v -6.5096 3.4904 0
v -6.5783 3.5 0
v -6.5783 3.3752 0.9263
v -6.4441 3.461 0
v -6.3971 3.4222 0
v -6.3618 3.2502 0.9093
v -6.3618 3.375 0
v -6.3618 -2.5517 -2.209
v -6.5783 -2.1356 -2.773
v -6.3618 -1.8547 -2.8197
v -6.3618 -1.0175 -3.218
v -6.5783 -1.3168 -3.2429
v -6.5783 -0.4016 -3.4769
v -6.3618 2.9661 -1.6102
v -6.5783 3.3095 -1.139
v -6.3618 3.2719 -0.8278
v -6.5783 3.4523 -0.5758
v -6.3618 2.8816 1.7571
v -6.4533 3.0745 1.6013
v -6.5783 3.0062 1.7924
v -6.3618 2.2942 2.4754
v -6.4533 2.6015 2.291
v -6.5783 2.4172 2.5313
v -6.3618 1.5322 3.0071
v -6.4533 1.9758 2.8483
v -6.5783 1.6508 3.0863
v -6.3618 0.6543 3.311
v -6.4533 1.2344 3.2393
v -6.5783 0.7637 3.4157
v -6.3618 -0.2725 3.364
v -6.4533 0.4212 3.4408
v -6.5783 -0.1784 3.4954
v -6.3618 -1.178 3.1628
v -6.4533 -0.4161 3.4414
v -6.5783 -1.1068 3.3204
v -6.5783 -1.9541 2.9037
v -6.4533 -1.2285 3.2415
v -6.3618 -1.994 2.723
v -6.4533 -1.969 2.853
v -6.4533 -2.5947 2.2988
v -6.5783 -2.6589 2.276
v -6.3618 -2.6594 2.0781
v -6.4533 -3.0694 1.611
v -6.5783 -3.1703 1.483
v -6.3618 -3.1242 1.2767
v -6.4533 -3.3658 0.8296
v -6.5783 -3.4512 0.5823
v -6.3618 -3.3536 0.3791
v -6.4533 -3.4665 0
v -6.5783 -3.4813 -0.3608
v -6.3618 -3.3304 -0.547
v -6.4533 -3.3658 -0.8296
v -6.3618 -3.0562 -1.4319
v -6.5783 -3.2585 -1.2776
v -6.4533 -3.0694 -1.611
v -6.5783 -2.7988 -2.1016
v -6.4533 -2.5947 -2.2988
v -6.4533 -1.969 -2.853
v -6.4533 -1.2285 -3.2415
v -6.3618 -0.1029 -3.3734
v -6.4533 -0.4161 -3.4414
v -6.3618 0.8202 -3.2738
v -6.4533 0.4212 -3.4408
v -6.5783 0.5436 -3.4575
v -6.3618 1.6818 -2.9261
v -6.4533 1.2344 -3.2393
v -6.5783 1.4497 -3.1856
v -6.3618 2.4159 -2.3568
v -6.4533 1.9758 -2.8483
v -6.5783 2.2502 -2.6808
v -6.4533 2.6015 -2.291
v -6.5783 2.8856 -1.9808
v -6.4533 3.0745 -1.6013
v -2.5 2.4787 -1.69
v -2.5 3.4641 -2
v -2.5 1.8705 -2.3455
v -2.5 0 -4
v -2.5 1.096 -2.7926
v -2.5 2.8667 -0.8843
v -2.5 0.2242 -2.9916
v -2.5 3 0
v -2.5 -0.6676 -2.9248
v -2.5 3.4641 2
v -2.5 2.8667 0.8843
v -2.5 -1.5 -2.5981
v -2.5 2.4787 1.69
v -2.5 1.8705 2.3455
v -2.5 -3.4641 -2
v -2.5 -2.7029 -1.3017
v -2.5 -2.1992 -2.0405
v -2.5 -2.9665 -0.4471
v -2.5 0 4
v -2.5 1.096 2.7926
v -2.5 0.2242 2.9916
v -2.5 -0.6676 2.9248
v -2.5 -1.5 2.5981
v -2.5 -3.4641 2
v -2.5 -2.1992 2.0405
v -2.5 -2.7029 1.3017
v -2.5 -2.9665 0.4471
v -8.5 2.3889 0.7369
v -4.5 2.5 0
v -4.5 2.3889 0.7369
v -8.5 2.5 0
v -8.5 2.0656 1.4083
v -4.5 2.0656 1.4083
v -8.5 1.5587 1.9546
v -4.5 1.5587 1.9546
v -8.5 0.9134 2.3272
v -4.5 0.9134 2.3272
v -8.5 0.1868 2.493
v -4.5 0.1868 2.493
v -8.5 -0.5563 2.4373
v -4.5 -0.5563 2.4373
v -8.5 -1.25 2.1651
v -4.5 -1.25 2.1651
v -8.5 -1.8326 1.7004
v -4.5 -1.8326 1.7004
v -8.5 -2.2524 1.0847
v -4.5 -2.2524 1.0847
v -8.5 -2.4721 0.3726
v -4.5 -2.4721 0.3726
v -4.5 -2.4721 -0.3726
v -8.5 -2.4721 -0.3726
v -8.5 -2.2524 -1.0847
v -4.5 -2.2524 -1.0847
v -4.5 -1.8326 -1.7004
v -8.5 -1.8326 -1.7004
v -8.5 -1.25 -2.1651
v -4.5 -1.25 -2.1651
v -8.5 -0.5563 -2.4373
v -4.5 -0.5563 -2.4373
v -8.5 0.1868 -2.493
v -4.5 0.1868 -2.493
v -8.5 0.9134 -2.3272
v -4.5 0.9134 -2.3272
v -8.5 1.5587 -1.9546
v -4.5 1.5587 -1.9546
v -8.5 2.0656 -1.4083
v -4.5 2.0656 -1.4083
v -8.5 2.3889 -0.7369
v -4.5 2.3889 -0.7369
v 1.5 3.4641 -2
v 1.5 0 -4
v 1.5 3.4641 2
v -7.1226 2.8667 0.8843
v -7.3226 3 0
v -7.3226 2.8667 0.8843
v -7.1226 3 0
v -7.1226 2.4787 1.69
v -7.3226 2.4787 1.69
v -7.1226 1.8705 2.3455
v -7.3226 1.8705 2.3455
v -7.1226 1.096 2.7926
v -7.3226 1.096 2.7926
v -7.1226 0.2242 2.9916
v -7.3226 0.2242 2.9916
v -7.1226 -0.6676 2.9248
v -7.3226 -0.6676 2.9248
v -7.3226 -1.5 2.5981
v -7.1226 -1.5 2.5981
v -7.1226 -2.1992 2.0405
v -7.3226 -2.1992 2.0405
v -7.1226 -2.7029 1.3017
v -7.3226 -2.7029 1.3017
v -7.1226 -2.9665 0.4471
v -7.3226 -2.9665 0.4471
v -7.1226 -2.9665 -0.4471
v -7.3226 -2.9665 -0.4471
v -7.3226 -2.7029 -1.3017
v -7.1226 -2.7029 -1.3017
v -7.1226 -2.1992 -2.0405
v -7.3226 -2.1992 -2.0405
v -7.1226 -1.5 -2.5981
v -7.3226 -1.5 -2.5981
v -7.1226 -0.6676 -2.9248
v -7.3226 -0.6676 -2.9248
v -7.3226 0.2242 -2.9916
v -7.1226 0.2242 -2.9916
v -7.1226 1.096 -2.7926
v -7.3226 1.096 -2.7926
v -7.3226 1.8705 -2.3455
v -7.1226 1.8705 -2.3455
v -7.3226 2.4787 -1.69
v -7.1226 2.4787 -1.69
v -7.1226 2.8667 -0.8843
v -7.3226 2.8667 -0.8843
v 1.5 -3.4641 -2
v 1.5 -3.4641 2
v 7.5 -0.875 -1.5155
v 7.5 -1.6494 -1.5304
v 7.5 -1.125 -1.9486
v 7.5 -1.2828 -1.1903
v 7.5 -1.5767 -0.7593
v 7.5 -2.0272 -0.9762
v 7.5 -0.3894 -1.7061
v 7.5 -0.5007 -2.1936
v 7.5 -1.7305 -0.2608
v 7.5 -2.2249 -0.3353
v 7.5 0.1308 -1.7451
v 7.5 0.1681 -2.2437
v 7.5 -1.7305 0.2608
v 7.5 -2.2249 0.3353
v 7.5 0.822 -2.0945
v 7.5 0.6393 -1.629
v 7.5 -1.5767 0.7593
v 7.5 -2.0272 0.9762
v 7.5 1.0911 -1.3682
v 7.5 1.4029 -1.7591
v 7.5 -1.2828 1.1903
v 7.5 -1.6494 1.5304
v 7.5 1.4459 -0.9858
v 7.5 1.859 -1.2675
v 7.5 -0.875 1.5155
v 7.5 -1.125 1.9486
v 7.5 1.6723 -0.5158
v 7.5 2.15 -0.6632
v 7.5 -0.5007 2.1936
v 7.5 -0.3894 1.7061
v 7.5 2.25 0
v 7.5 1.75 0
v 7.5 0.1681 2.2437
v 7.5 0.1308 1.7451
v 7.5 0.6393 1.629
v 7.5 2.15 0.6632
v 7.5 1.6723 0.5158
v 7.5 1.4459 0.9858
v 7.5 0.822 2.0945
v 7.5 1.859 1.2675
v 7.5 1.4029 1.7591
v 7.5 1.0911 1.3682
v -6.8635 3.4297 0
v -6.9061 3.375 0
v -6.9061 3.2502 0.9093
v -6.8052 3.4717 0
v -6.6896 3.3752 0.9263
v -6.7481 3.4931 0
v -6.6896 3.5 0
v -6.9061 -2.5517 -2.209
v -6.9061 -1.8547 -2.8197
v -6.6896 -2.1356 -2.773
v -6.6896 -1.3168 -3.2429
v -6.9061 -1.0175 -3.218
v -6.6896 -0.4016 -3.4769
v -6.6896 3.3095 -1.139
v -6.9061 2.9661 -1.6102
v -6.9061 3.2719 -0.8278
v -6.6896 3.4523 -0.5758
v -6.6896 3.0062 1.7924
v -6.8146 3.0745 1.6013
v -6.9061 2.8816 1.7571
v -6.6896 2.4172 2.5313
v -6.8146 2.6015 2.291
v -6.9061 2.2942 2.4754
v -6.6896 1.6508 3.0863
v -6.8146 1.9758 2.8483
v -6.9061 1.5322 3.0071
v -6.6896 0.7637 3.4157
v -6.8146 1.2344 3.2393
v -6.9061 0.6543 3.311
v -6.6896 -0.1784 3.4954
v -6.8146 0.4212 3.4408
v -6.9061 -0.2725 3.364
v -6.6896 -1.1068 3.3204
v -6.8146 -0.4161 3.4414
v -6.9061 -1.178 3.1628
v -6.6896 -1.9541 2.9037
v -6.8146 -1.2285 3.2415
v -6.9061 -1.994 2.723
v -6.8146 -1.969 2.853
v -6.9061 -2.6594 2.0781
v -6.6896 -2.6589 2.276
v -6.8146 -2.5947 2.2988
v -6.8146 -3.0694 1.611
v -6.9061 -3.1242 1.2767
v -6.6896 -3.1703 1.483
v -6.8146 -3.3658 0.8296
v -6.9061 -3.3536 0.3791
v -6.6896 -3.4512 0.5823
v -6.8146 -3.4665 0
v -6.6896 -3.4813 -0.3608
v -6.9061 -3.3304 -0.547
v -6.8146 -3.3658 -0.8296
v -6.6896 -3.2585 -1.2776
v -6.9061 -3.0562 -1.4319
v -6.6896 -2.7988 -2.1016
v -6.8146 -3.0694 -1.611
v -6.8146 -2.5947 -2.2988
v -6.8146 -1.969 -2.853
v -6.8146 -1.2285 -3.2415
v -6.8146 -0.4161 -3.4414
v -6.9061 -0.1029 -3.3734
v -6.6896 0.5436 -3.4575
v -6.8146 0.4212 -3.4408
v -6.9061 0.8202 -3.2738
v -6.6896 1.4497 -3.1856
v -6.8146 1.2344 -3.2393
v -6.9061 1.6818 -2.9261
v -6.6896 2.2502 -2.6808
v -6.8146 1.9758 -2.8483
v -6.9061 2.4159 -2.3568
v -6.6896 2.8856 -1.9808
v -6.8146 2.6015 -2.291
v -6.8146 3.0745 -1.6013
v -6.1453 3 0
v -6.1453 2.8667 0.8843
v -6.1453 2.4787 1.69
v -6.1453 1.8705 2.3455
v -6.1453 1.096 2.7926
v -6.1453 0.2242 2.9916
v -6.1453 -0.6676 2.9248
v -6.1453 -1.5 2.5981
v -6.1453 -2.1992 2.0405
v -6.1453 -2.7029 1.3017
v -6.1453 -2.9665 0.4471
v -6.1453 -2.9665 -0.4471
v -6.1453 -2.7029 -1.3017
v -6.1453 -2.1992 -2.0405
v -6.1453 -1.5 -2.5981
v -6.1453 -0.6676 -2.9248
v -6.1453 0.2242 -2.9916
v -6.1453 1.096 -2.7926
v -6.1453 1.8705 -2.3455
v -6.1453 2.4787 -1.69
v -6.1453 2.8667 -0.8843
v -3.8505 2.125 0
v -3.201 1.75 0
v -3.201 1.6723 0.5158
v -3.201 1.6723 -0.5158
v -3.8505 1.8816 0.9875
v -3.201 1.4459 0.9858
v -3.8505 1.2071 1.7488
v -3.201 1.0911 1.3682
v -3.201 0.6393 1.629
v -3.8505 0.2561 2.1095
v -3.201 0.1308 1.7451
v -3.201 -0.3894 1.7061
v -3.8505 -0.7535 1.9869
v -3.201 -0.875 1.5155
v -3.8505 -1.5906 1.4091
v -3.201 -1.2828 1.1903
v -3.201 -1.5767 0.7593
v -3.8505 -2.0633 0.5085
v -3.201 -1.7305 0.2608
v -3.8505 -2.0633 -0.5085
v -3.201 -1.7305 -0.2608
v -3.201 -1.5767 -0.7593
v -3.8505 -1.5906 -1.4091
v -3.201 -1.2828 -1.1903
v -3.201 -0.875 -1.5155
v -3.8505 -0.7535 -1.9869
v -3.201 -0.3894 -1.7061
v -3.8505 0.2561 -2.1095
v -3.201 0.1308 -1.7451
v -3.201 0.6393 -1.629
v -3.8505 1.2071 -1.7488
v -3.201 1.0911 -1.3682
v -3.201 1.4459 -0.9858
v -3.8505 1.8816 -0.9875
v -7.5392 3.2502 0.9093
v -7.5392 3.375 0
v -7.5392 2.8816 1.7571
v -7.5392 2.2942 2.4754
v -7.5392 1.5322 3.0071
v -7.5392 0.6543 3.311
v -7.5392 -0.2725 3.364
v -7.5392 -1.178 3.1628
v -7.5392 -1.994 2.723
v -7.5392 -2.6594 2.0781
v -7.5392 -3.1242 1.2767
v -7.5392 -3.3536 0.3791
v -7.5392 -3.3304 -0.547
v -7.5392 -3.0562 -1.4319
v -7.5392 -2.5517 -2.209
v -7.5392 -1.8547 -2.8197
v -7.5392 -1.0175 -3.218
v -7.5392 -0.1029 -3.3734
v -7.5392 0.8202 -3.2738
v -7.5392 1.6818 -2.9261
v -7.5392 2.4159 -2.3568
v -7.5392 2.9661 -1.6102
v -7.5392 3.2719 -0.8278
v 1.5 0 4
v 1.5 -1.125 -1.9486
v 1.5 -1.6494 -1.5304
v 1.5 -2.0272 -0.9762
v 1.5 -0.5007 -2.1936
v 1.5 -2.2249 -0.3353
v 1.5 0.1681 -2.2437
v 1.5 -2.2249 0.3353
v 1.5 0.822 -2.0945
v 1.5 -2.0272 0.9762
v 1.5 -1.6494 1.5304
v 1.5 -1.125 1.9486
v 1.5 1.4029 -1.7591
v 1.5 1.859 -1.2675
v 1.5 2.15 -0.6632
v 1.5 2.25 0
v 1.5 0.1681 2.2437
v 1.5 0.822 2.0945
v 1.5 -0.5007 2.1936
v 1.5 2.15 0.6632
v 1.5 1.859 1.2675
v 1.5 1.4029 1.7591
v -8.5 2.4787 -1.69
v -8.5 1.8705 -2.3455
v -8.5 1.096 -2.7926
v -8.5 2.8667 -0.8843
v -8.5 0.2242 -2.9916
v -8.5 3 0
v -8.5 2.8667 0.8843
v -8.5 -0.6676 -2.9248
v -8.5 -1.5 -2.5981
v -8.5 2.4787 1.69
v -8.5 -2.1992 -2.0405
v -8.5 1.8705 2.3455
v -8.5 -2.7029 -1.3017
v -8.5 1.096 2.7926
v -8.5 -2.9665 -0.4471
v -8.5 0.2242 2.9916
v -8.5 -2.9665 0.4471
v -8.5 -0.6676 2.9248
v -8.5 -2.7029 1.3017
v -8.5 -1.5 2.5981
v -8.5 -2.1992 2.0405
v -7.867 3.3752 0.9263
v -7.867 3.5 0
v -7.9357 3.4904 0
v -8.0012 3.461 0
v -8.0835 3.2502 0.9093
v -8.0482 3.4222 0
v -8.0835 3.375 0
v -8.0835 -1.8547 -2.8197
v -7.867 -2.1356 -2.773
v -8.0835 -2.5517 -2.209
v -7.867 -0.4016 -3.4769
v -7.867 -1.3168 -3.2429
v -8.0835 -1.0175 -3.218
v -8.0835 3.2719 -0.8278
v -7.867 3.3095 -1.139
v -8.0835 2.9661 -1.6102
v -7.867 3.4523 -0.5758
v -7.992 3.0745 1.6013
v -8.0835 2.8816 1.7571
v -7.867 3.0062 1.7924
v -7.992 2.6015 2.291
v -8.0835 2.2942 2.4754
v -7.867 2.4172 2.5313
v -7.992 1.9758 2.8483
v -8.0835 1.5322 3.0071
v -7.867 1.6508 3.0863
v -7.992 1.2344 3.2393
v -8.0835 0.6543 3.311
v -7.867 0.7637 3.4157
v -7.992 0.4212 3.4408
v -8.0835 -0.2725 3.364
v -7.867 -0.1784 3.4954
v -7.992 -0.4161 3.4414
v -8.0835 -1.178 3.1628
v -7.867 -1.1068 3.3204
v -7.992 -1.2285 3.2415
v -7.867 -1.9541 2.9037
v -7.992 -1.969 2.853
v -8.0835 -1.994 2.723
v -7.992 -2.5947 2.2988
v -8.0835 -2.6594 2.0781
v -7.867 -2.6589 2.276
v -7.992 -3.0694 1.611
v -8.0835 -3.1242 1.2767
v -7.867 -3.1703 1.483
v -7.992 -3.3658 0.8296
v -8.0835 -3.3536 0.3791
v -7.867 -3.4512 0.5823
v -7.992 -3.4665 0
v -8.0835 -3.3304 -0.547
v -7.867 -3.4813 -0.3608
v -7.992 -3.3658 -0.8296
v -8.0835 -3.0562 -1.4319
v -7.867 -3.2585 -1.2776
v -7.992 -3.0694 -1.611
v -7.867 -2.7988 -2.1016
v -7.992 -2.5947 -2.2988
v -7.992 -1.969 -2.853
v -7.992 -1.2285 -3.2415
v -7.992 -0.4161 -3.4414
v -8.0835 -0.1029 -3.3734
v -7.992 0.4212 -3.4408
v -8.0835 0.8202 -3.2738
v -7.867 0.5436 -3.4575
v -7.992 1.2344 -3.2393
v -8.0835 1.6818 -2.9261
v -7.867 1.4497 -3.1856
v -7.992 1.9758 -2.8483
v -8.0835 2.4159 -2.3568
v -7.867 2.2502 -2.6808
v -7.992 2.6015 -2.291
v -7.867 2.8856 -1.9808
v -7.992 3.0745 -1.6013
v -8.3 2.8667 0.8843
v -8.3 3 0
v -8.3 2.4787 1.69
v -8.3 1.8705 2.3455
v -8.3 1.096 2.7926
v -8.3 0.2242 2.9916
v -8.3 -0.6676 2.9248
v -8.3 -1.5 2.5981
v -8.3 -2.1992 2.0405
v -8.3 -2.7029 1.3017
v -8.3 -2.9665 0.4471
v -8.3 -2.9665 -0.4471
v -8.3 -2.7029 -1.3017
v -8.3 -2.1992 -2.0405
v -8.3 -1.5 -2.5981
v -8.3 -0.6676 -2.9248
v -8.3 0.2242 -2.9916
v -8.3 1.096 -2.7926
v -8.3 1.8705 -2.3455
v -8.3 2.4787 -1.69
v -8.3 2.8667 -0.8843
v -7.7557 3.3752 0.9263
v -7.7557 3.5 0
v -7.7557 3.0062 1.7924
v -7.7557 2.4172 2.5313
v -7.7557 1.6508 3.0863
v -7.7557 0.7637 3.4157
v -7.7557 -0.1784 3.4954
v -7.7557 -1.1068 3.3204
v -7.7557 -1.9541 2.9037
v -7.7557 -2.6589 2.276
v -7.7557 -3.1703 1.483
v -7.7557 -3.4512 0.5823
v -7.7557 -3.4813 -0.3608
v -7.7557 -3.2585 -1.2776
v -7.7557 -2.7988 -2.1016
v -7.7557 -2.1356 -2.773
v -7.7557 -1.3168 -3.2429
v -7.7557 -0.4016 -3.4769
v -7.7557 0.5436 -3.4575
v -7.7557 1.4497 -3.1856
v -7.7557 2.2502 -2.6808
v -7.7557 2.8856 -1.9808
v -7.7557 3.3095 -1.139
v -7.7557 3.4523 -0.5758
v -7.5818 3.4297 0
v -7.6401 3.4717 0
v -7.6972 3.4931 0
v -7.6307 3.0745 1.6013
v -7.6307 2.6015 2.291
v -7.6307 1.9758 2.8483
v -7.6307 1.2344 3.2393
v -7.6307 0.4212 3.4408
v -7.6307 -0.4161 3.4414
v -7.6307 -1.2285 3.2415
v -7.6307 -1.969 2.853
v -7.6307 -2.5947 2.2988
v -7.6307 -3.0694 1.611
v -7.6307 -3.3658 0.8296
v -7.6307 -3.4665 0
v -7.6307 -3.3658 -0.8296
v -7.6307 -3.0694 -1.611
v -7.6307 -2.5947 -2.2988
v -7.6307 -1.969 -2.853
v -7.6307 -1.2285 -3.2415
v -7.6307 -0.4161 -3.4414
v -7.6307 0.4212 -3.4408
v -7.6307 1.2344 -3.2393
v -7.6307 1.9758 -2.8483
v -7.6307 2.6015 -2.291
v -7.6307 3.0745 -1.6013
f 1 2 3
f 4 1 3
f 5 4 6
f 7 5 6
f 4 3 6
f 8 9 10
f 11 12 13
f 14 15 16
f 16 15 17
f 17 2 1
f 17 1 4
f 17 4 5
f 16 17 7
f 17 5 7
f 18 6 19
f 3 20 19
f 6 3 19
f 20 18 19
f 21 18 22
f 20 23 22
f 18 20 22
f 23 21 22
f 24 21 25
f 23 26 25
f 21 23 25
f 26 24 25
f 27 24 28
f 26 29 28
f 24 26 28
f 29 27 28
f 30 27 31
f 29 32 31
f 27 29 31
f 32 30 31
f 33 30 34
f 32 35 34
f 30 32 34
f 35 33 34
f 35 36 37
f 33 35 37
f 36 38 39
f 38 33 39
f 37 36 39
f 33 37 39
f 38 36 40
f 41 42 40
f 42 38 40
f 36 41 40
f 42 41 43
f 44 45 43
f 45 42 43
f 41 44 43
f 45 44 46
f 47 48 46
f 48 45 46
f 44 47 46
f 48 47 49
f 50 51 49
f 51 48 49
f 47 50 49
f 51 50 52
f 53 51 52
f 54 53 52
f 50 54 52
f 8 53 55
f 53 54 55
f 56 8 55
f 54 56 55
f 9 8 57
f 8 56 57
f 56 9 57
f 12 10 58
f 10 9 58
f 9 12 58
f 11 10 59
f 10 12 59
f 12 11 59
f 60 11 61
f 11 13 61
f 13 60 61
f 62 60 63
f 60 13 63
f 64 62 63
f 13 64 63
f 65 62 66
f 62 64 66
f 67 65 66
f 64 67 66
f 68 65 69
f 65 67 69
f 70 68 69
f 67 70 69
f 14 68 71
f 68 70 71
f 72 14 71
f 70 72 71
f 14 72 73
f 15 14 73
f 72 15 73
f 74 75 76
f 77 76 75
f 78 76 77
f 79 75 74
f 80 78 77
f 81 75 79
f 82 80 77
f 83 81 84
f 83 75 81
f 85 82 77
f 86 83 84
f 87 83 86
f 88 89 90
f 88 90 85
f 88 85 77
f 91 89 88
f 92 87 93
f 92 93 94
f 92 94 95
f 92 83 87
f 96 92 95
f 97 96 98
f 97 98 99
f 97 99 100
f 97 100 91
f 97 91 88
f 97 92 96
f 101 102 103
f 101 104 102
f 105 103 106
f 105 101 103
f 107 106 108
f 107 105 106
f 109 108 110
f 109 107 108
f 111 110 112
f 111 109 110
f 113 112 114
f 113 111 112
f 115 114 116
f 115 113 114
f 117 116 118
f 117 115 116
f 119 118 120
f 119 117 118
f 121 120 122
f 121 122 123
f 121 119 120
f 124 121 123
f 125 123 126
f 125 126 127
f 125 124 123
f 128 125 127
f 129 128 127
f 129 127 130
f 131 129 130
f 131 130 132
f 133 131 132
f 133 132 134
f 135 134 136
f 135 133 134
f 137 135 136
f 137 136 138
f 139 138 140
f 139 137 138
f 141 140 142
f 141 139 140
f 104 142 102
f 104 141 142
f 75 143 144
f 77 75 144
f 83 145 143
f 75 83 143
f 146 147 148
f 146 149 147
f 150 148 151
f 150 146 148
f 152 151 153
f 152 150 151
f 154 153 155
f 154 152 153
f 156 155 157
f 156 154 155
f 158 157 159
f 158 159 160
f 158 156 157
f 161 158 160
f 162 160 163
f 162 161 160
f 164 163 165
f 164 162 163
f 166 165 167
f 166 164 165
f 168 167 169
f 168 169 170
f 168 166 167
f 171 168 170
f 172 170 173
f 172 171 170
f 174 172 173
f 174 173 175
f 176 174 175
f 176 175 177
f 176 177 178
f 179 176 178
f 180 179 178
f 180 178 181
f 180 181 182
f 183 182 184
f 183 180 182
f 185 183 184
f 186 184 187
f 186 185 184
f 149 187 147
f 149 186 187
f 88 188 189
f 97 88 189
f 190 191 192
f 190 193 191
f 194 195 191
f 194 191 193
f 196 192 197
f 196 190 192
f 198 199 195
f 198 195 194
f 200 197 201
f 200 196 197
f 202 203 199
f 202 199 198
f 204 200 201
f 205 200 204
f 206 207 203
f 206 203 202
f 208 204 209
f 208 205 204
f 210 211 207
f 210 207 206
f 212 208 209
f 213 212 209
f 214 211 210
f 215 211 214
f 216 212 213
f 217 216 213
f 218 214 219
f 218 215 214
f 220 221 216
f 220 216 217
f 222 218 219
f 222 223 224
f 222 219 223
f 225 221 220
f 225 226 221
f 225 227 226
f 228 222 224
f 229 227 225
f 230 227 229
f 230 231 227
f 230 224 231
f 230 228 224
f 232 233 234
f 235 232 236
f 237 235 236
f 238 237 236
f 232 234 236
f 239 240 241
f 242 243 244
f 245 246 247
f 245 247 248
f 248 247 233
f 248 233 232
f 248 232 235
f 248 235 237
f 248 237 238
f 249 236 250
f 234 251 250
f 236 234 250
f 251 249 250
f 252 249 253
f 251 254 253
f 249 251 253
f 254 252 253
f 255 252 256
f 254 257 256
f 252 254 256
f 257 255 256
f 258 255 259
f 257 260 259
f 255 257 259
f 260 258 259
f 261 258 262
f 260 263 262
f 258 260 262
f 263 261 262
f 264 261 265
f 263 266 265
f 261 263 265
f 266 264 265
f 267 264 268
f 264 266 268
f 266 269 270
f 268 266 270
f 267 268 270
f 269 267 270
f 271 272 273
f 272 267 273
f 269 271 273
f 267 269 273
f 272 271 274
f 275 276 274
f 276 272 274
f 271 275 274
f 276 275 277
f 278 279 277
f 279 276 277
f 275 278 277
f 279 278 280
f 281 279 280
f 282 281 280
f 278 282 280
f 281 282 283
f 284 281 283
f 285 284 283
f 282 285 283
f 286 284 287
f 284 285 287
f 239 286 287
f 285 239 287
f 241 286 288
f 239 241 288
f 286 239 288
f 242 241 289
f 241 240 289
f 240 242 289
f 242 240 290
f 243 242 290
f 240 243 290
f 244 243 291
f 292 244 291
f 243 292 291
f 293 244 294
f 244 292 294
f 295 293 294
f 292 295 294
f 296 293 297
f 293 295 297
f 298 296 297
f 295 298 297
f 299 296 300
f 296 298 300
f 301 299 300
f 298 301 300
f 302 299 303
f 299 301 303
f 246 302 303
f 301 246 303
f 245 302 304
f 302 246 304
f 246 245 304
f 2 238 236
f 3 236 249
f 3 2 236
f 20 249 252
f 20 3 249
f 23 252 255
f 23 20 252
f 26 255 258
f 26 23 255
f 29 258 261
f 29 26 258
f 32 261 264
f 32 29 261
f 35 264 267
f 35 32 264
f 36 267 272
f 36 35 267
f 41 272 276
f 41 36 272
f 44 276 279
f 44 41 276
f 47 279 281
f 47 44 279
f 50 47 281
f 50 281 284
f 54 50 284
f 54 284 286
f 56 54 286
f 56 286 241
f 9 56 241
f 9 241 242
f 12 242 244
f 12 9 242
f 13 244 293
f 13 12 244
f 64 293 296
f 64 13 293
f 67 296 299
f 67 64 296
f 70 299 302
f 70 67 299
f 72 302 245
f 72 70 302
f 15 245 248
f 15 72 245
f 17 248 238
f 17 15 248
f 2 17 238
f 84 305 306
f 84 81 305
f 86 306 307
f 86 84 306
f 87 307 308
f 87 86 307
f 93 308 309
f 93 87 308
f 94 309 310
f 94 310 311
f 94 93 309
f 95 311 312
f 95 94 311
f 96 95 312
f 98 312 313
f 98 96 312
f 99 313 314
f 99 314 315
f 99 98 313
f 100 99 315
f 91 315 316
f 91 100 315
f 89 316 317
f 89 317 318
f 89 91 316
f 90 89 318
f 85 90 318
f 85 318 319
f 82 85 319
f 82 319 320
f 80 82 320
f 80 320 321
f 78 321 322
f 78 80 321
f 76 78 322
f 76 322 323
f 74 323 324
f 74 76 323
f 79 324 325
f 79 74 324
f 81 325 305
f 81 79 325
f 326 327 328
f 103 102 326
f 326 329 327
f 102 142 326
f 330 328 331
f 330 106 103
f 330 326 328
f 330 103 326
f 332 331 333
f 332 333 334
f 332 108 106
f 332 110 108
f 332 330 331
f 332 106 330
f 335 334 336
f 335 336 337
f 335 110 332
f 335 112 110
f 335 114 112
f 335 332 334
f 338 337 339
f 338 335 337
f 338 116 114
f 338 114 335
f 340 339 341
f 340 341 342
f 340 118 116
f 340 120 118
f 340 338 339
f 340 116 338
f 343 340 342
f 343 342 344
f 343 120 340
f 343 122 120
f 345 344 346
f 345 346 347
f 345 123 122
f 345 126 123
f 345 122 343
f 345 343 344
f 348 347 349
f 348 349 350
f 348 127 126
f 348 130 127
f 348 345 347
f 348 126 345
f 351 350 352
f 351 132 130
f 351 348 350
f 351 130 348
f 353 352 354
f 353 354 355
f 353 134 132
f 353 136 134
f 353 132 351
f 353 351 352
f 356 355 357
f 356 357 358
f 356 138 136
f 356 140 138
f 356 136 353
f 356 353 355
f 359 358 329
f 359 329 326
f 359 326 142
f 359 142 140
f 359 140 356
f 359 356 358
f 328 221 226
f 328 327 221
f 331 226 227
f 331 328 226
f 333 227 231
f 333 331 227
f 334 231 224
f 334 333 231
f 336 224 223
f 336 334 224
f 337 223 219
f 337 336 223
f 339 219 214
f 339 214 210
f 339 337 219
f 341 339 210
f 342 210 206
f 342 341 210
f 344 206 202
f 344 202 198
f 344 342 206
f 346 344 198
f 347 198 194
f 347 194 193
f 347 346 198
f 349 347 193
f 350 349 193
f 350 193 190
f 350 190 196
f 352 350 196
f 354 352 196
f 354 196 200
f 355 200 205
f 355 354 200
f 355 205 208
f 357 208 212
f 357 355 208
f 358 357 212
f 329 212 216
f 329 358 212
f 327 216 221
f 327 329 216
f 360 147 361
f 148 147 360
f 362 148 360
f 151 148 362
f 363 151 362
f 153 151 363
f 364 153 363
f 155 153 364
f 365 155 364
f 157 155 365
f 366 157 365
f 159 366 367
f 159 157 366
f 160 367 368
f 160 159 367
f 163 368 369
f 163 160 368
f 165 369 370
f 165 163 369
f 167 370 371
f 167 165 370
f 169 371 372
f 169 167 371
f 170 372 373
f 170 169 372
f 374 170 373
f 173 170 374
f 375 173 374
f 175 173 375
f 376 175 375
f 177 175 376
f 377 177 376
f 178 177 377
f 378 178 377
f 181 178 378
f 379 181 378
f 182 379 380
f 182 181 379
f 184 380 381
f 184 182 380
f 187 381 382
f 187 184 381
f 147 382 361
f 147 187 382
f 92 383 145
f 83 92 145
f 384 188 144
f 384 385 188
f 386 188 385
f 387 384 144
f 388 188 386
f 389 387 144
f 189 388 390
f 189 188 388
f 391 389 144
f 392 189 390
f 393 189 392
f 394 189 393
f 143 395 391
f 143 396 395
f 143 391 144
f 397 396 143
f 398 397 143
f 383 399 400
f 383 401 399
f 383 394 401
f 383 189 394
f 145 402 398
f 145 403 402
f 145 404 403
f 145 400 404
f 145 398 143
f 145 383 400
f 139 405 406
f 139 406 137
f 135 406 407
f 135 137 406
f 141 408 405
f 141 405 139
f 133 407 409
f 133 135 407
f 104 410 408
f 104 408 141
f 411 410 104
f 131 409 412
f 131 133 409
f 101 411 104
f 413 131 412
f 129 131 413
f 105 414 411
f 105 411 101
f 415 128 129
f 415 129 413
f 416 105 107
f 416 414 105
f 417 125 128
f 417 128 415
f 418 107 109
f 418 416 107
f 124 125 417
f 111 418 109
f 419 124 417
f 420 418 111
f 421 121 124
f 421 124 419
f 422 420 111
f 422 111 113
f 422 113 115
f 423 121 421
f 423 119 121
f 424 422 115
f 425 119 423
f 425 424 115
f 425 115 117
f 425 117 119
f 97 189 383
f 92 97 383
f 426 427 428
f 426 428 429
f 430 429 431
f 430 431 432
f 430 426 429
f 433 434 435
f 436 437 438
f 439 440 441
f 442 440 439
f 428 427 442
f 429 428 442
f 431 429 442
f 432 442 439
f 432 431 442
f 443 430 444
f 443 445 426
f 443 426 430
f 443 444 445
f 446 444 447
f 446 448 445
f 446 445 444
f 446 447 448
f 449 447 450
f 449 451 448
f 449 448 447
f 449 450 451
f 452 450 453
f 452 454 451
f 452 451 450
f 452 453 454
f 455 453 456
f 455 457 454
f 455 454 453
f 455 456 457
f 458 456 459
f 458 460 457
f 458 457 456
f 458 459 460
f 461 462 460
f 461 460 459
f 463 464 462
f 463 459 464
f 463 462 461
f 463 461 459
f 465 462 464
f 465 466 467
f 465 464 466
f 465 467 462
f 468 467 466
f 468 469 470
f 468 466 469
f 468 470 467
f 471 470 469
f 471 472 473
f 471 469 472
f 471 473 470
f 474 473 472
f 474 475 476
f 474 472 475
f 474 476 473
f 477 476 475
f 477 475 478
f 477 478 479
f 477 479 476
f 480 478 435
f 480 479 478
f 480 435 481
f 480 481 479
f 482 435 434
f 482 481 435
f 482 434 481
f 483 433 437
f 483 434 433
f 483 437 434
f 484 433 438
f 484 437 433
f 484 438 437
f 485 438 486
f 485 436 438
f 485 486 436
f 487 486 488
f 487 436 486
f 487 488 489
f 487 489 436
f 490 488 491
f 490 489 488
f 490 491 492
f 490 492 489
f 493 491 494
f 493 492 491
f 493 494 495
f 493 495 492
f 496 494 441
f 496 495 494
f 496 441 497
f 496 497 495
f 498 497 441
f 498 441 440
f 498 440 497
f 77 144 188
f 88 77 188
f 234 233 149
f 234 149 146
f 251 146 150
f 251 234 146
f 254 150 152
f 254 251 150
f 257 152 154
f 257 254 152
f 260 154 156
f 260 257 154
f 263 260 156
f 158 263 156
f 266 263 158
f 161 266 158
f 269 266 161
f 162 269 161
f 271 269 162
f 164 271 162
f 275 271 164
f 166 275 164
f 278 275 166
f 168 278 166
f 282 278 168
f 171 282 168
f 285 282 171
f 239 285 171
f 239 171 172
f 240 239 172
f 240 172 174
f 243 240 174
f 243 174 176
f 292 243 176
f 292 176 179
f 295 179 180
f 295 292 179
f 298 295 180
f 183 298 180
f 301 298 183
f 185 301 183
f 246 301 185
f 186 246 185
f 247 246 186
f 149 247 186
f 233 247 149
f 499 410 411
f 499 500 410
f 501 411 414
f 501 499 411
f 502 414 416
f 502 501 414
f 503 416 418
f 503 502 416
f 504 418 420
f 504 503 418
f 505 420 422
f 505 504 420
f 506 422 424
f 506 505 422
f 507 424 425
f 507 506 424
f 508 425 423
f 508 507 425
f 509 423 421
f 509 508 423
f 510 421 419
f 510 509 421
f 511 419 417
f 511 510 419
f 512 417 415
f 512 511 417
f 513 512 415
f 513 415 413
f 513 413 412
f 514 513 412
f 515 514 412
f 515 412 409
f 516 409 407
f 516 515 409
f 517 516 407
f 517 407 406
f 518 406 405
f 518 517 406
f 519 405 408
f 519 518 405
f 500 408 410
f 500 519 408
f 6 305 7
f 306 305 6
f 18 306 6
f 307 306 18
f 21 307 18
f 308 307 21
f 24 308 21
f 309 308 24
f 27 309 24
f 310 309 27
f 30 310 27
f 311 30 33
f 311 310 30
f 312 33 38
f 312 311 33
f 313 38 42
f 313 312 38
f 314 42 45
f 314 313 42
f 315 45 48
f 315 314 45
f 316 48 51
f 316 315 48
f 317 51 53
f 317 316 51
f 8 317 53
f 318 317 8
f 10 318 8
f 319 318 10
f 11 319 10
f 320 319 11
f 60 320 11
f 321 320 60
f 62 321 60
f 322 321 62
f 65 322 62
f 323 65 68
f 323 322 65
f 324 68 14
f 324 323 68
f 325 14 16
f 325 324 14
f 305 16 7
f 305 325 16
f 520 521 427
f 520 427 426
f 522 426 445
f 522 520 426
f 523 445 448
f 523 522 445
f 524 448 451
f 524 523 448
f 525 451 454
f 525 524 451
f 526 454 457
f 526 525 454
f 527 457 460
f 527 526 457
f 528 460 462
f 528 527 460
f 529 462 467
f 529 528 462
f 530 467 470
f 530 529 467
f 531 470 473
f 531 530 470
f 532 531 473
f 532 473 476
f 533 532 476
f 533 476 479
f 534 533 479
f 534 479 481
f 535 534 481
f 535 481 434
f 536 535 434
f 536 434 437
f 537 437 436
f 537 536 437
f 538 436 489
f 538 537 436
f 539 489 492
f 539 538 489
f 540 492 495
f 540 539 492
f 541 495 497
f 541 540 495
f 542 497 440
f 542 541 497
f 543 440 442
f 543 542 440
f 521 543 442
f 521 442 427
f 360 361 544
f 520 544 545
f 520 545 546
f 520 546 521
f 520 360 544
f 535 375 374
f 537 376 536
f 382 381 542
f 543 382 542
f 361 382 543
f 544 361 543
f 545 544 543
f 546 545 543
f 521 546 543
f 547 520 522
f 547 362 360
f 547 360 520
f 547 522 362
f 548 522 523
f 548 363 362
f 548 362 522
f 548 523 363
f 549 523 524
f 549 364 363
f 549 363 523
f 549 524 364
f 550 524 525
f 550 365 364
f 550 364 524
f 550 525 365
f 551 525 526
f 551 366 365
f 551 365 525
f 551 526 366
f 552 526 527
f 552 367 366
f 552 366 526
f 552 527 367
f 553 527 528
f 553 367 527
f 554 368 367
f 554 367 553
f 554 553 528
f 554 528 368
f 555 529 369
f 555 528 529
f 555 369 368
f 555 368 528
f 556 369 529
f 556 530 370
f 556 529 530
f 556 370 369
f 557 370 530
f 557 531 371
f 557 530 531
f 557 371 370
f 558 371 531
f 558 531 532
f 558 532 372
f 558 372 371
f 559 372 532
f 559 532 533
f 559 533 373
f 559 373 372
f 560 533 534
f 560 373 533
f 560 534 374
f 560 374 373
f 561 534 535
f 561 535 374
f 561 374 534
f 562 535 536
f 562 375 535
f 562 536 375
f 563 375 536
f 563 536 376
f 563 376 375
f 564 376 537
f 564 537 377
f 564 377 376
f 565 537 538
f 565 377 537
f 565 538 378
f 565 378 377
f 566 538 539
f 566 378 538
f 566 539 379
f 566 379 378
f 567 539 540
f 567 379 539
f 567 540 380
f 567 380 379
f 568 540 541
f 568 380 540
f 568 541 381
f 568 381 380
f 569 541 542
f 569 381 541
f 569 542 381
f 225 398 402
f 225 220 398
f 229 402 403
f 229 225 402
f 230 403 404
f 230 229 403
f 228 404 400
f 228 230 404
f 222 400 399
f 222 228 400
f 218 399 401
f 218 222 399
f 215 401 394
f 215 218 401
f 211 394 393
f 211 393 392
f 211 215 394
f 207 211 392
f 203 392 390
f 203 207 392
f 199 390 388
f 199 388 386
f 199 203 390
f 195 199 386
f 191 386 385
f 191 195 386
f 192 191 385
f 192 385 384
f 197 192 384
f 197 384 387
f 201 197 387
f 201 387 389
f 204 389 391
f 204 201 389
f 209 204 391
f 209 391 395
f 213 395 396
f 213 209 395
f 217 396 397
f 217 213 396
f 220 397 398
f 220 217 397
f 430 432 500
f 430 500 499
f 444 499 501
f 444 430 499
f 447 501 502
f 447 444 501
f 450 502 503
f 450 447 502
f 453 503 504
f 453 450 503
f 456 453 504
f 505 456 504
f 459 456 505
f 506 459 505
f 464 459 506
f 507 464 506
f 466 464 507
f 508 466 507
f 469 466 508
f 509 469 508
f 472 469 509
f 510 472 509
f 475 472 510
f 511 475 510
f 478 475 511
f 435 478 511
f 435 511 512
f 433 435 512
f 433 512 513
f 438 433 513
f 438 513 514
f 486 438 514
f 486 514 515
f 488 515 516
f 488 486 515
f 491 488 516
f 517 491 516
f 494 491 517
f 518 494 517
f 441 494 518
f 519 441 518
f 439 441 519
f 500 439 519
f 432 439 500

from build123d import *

# Parameters (mm, degrees)
CORTE_EXTRUS_O1_DEPTH = 4
FILETE1_R             = 0.25
FILETE2_R             = 0.25


with BuildPart() as part:
    # Esboço1 → Revolução1 (revolve)
    with BuildSketch(Plane.XY):
        Polygon((-7.322649731, 3), (-7.122649731, 3), (-6.833974596, 3.5), (-6.433974596, 3.5), (-6.145299462, 3), (-2.5, 3), (-2.5, 4), (1.5, 4), (1.5, 2.25), (7.5, 2.25), (7.5, 1.75), (-3.200961894, 1.75), (-4.5, 2.5), (-8.5, 2.5), (-8.5, 3), (-8.3, 3), (-8.011324865, 3.5), (-7.611324865, 3.5), align=None)
    revolve(axis=Axis((-29.721905334, 0, 0), (1, 0, 0)))

    # Esboço2 → Corte-extrusão1 (cut)
    with BuildSketch(Plane(origin=(1.5, 0, 0), x_dir=(0, 0, -1), z_dir=(1, 0, 0))):
        with BuildLine():
            Line((-2, 3.464101615), (2, 3.464101615))
            ThreePointArc((2, 3.464101615), (0, 4), (-2, 3.464101615))
        make_face()
        with BuildLine():
            Line((-4, 0), (-2, 3.464101615))
            ThreePointArc((-2, 3.464101615), (-3.464101615, 2), (-4, 0))
        make_face()
        with BuildLine():
            ThreePointArc((-4, 0), (-3.464101615, -2), (-2, -3.464101615))
            Line((-2, -3.464101615), (-4, 0))
        make_face()
        with BuildLine():
            ThreePointArc((-2, -3.464101615), (0, -4), (2, -3.464101615))
            Line((2, -3.464101615), (-2, -3.464101615))
        make_face()
        with BuildLine():
            ThreePointArc((2, -3.464101615), (3.464101615, -2), (4, 0))
            Line((4, 0), (2, -3.464101615))
        make_face()
        with BuildLine():
            Line((2, 3.464101615), (4, 0))
            ThreePointArc((4, 0), (3.464101615, 2), (2, 3.464101615))
        make_face()
    extrude(amount=-CORTE_EXTRUS_O1_DEPTH, mode=Mode.SUBTRACT)

    # Filete1
    filete1_edges = [part.edges().sort_by_distance(p)[0] for p in [
        (-8.011324865, -3.5, 0),
        (-7.611324865, -3.5, 0),
    ]]
    fillet(filete1_edges, radius=FILETE1_R)

    # Filete2
    filete2_edges = [part.edges().sort_by_distance(p)[0] for p in [
        (-6.833974596, -3.5, 0),
        (-6.433974596, -3.5, 0),
    ]]
    fillet(filete2_edges, radius=FILETE2_R)


solid = part.part
